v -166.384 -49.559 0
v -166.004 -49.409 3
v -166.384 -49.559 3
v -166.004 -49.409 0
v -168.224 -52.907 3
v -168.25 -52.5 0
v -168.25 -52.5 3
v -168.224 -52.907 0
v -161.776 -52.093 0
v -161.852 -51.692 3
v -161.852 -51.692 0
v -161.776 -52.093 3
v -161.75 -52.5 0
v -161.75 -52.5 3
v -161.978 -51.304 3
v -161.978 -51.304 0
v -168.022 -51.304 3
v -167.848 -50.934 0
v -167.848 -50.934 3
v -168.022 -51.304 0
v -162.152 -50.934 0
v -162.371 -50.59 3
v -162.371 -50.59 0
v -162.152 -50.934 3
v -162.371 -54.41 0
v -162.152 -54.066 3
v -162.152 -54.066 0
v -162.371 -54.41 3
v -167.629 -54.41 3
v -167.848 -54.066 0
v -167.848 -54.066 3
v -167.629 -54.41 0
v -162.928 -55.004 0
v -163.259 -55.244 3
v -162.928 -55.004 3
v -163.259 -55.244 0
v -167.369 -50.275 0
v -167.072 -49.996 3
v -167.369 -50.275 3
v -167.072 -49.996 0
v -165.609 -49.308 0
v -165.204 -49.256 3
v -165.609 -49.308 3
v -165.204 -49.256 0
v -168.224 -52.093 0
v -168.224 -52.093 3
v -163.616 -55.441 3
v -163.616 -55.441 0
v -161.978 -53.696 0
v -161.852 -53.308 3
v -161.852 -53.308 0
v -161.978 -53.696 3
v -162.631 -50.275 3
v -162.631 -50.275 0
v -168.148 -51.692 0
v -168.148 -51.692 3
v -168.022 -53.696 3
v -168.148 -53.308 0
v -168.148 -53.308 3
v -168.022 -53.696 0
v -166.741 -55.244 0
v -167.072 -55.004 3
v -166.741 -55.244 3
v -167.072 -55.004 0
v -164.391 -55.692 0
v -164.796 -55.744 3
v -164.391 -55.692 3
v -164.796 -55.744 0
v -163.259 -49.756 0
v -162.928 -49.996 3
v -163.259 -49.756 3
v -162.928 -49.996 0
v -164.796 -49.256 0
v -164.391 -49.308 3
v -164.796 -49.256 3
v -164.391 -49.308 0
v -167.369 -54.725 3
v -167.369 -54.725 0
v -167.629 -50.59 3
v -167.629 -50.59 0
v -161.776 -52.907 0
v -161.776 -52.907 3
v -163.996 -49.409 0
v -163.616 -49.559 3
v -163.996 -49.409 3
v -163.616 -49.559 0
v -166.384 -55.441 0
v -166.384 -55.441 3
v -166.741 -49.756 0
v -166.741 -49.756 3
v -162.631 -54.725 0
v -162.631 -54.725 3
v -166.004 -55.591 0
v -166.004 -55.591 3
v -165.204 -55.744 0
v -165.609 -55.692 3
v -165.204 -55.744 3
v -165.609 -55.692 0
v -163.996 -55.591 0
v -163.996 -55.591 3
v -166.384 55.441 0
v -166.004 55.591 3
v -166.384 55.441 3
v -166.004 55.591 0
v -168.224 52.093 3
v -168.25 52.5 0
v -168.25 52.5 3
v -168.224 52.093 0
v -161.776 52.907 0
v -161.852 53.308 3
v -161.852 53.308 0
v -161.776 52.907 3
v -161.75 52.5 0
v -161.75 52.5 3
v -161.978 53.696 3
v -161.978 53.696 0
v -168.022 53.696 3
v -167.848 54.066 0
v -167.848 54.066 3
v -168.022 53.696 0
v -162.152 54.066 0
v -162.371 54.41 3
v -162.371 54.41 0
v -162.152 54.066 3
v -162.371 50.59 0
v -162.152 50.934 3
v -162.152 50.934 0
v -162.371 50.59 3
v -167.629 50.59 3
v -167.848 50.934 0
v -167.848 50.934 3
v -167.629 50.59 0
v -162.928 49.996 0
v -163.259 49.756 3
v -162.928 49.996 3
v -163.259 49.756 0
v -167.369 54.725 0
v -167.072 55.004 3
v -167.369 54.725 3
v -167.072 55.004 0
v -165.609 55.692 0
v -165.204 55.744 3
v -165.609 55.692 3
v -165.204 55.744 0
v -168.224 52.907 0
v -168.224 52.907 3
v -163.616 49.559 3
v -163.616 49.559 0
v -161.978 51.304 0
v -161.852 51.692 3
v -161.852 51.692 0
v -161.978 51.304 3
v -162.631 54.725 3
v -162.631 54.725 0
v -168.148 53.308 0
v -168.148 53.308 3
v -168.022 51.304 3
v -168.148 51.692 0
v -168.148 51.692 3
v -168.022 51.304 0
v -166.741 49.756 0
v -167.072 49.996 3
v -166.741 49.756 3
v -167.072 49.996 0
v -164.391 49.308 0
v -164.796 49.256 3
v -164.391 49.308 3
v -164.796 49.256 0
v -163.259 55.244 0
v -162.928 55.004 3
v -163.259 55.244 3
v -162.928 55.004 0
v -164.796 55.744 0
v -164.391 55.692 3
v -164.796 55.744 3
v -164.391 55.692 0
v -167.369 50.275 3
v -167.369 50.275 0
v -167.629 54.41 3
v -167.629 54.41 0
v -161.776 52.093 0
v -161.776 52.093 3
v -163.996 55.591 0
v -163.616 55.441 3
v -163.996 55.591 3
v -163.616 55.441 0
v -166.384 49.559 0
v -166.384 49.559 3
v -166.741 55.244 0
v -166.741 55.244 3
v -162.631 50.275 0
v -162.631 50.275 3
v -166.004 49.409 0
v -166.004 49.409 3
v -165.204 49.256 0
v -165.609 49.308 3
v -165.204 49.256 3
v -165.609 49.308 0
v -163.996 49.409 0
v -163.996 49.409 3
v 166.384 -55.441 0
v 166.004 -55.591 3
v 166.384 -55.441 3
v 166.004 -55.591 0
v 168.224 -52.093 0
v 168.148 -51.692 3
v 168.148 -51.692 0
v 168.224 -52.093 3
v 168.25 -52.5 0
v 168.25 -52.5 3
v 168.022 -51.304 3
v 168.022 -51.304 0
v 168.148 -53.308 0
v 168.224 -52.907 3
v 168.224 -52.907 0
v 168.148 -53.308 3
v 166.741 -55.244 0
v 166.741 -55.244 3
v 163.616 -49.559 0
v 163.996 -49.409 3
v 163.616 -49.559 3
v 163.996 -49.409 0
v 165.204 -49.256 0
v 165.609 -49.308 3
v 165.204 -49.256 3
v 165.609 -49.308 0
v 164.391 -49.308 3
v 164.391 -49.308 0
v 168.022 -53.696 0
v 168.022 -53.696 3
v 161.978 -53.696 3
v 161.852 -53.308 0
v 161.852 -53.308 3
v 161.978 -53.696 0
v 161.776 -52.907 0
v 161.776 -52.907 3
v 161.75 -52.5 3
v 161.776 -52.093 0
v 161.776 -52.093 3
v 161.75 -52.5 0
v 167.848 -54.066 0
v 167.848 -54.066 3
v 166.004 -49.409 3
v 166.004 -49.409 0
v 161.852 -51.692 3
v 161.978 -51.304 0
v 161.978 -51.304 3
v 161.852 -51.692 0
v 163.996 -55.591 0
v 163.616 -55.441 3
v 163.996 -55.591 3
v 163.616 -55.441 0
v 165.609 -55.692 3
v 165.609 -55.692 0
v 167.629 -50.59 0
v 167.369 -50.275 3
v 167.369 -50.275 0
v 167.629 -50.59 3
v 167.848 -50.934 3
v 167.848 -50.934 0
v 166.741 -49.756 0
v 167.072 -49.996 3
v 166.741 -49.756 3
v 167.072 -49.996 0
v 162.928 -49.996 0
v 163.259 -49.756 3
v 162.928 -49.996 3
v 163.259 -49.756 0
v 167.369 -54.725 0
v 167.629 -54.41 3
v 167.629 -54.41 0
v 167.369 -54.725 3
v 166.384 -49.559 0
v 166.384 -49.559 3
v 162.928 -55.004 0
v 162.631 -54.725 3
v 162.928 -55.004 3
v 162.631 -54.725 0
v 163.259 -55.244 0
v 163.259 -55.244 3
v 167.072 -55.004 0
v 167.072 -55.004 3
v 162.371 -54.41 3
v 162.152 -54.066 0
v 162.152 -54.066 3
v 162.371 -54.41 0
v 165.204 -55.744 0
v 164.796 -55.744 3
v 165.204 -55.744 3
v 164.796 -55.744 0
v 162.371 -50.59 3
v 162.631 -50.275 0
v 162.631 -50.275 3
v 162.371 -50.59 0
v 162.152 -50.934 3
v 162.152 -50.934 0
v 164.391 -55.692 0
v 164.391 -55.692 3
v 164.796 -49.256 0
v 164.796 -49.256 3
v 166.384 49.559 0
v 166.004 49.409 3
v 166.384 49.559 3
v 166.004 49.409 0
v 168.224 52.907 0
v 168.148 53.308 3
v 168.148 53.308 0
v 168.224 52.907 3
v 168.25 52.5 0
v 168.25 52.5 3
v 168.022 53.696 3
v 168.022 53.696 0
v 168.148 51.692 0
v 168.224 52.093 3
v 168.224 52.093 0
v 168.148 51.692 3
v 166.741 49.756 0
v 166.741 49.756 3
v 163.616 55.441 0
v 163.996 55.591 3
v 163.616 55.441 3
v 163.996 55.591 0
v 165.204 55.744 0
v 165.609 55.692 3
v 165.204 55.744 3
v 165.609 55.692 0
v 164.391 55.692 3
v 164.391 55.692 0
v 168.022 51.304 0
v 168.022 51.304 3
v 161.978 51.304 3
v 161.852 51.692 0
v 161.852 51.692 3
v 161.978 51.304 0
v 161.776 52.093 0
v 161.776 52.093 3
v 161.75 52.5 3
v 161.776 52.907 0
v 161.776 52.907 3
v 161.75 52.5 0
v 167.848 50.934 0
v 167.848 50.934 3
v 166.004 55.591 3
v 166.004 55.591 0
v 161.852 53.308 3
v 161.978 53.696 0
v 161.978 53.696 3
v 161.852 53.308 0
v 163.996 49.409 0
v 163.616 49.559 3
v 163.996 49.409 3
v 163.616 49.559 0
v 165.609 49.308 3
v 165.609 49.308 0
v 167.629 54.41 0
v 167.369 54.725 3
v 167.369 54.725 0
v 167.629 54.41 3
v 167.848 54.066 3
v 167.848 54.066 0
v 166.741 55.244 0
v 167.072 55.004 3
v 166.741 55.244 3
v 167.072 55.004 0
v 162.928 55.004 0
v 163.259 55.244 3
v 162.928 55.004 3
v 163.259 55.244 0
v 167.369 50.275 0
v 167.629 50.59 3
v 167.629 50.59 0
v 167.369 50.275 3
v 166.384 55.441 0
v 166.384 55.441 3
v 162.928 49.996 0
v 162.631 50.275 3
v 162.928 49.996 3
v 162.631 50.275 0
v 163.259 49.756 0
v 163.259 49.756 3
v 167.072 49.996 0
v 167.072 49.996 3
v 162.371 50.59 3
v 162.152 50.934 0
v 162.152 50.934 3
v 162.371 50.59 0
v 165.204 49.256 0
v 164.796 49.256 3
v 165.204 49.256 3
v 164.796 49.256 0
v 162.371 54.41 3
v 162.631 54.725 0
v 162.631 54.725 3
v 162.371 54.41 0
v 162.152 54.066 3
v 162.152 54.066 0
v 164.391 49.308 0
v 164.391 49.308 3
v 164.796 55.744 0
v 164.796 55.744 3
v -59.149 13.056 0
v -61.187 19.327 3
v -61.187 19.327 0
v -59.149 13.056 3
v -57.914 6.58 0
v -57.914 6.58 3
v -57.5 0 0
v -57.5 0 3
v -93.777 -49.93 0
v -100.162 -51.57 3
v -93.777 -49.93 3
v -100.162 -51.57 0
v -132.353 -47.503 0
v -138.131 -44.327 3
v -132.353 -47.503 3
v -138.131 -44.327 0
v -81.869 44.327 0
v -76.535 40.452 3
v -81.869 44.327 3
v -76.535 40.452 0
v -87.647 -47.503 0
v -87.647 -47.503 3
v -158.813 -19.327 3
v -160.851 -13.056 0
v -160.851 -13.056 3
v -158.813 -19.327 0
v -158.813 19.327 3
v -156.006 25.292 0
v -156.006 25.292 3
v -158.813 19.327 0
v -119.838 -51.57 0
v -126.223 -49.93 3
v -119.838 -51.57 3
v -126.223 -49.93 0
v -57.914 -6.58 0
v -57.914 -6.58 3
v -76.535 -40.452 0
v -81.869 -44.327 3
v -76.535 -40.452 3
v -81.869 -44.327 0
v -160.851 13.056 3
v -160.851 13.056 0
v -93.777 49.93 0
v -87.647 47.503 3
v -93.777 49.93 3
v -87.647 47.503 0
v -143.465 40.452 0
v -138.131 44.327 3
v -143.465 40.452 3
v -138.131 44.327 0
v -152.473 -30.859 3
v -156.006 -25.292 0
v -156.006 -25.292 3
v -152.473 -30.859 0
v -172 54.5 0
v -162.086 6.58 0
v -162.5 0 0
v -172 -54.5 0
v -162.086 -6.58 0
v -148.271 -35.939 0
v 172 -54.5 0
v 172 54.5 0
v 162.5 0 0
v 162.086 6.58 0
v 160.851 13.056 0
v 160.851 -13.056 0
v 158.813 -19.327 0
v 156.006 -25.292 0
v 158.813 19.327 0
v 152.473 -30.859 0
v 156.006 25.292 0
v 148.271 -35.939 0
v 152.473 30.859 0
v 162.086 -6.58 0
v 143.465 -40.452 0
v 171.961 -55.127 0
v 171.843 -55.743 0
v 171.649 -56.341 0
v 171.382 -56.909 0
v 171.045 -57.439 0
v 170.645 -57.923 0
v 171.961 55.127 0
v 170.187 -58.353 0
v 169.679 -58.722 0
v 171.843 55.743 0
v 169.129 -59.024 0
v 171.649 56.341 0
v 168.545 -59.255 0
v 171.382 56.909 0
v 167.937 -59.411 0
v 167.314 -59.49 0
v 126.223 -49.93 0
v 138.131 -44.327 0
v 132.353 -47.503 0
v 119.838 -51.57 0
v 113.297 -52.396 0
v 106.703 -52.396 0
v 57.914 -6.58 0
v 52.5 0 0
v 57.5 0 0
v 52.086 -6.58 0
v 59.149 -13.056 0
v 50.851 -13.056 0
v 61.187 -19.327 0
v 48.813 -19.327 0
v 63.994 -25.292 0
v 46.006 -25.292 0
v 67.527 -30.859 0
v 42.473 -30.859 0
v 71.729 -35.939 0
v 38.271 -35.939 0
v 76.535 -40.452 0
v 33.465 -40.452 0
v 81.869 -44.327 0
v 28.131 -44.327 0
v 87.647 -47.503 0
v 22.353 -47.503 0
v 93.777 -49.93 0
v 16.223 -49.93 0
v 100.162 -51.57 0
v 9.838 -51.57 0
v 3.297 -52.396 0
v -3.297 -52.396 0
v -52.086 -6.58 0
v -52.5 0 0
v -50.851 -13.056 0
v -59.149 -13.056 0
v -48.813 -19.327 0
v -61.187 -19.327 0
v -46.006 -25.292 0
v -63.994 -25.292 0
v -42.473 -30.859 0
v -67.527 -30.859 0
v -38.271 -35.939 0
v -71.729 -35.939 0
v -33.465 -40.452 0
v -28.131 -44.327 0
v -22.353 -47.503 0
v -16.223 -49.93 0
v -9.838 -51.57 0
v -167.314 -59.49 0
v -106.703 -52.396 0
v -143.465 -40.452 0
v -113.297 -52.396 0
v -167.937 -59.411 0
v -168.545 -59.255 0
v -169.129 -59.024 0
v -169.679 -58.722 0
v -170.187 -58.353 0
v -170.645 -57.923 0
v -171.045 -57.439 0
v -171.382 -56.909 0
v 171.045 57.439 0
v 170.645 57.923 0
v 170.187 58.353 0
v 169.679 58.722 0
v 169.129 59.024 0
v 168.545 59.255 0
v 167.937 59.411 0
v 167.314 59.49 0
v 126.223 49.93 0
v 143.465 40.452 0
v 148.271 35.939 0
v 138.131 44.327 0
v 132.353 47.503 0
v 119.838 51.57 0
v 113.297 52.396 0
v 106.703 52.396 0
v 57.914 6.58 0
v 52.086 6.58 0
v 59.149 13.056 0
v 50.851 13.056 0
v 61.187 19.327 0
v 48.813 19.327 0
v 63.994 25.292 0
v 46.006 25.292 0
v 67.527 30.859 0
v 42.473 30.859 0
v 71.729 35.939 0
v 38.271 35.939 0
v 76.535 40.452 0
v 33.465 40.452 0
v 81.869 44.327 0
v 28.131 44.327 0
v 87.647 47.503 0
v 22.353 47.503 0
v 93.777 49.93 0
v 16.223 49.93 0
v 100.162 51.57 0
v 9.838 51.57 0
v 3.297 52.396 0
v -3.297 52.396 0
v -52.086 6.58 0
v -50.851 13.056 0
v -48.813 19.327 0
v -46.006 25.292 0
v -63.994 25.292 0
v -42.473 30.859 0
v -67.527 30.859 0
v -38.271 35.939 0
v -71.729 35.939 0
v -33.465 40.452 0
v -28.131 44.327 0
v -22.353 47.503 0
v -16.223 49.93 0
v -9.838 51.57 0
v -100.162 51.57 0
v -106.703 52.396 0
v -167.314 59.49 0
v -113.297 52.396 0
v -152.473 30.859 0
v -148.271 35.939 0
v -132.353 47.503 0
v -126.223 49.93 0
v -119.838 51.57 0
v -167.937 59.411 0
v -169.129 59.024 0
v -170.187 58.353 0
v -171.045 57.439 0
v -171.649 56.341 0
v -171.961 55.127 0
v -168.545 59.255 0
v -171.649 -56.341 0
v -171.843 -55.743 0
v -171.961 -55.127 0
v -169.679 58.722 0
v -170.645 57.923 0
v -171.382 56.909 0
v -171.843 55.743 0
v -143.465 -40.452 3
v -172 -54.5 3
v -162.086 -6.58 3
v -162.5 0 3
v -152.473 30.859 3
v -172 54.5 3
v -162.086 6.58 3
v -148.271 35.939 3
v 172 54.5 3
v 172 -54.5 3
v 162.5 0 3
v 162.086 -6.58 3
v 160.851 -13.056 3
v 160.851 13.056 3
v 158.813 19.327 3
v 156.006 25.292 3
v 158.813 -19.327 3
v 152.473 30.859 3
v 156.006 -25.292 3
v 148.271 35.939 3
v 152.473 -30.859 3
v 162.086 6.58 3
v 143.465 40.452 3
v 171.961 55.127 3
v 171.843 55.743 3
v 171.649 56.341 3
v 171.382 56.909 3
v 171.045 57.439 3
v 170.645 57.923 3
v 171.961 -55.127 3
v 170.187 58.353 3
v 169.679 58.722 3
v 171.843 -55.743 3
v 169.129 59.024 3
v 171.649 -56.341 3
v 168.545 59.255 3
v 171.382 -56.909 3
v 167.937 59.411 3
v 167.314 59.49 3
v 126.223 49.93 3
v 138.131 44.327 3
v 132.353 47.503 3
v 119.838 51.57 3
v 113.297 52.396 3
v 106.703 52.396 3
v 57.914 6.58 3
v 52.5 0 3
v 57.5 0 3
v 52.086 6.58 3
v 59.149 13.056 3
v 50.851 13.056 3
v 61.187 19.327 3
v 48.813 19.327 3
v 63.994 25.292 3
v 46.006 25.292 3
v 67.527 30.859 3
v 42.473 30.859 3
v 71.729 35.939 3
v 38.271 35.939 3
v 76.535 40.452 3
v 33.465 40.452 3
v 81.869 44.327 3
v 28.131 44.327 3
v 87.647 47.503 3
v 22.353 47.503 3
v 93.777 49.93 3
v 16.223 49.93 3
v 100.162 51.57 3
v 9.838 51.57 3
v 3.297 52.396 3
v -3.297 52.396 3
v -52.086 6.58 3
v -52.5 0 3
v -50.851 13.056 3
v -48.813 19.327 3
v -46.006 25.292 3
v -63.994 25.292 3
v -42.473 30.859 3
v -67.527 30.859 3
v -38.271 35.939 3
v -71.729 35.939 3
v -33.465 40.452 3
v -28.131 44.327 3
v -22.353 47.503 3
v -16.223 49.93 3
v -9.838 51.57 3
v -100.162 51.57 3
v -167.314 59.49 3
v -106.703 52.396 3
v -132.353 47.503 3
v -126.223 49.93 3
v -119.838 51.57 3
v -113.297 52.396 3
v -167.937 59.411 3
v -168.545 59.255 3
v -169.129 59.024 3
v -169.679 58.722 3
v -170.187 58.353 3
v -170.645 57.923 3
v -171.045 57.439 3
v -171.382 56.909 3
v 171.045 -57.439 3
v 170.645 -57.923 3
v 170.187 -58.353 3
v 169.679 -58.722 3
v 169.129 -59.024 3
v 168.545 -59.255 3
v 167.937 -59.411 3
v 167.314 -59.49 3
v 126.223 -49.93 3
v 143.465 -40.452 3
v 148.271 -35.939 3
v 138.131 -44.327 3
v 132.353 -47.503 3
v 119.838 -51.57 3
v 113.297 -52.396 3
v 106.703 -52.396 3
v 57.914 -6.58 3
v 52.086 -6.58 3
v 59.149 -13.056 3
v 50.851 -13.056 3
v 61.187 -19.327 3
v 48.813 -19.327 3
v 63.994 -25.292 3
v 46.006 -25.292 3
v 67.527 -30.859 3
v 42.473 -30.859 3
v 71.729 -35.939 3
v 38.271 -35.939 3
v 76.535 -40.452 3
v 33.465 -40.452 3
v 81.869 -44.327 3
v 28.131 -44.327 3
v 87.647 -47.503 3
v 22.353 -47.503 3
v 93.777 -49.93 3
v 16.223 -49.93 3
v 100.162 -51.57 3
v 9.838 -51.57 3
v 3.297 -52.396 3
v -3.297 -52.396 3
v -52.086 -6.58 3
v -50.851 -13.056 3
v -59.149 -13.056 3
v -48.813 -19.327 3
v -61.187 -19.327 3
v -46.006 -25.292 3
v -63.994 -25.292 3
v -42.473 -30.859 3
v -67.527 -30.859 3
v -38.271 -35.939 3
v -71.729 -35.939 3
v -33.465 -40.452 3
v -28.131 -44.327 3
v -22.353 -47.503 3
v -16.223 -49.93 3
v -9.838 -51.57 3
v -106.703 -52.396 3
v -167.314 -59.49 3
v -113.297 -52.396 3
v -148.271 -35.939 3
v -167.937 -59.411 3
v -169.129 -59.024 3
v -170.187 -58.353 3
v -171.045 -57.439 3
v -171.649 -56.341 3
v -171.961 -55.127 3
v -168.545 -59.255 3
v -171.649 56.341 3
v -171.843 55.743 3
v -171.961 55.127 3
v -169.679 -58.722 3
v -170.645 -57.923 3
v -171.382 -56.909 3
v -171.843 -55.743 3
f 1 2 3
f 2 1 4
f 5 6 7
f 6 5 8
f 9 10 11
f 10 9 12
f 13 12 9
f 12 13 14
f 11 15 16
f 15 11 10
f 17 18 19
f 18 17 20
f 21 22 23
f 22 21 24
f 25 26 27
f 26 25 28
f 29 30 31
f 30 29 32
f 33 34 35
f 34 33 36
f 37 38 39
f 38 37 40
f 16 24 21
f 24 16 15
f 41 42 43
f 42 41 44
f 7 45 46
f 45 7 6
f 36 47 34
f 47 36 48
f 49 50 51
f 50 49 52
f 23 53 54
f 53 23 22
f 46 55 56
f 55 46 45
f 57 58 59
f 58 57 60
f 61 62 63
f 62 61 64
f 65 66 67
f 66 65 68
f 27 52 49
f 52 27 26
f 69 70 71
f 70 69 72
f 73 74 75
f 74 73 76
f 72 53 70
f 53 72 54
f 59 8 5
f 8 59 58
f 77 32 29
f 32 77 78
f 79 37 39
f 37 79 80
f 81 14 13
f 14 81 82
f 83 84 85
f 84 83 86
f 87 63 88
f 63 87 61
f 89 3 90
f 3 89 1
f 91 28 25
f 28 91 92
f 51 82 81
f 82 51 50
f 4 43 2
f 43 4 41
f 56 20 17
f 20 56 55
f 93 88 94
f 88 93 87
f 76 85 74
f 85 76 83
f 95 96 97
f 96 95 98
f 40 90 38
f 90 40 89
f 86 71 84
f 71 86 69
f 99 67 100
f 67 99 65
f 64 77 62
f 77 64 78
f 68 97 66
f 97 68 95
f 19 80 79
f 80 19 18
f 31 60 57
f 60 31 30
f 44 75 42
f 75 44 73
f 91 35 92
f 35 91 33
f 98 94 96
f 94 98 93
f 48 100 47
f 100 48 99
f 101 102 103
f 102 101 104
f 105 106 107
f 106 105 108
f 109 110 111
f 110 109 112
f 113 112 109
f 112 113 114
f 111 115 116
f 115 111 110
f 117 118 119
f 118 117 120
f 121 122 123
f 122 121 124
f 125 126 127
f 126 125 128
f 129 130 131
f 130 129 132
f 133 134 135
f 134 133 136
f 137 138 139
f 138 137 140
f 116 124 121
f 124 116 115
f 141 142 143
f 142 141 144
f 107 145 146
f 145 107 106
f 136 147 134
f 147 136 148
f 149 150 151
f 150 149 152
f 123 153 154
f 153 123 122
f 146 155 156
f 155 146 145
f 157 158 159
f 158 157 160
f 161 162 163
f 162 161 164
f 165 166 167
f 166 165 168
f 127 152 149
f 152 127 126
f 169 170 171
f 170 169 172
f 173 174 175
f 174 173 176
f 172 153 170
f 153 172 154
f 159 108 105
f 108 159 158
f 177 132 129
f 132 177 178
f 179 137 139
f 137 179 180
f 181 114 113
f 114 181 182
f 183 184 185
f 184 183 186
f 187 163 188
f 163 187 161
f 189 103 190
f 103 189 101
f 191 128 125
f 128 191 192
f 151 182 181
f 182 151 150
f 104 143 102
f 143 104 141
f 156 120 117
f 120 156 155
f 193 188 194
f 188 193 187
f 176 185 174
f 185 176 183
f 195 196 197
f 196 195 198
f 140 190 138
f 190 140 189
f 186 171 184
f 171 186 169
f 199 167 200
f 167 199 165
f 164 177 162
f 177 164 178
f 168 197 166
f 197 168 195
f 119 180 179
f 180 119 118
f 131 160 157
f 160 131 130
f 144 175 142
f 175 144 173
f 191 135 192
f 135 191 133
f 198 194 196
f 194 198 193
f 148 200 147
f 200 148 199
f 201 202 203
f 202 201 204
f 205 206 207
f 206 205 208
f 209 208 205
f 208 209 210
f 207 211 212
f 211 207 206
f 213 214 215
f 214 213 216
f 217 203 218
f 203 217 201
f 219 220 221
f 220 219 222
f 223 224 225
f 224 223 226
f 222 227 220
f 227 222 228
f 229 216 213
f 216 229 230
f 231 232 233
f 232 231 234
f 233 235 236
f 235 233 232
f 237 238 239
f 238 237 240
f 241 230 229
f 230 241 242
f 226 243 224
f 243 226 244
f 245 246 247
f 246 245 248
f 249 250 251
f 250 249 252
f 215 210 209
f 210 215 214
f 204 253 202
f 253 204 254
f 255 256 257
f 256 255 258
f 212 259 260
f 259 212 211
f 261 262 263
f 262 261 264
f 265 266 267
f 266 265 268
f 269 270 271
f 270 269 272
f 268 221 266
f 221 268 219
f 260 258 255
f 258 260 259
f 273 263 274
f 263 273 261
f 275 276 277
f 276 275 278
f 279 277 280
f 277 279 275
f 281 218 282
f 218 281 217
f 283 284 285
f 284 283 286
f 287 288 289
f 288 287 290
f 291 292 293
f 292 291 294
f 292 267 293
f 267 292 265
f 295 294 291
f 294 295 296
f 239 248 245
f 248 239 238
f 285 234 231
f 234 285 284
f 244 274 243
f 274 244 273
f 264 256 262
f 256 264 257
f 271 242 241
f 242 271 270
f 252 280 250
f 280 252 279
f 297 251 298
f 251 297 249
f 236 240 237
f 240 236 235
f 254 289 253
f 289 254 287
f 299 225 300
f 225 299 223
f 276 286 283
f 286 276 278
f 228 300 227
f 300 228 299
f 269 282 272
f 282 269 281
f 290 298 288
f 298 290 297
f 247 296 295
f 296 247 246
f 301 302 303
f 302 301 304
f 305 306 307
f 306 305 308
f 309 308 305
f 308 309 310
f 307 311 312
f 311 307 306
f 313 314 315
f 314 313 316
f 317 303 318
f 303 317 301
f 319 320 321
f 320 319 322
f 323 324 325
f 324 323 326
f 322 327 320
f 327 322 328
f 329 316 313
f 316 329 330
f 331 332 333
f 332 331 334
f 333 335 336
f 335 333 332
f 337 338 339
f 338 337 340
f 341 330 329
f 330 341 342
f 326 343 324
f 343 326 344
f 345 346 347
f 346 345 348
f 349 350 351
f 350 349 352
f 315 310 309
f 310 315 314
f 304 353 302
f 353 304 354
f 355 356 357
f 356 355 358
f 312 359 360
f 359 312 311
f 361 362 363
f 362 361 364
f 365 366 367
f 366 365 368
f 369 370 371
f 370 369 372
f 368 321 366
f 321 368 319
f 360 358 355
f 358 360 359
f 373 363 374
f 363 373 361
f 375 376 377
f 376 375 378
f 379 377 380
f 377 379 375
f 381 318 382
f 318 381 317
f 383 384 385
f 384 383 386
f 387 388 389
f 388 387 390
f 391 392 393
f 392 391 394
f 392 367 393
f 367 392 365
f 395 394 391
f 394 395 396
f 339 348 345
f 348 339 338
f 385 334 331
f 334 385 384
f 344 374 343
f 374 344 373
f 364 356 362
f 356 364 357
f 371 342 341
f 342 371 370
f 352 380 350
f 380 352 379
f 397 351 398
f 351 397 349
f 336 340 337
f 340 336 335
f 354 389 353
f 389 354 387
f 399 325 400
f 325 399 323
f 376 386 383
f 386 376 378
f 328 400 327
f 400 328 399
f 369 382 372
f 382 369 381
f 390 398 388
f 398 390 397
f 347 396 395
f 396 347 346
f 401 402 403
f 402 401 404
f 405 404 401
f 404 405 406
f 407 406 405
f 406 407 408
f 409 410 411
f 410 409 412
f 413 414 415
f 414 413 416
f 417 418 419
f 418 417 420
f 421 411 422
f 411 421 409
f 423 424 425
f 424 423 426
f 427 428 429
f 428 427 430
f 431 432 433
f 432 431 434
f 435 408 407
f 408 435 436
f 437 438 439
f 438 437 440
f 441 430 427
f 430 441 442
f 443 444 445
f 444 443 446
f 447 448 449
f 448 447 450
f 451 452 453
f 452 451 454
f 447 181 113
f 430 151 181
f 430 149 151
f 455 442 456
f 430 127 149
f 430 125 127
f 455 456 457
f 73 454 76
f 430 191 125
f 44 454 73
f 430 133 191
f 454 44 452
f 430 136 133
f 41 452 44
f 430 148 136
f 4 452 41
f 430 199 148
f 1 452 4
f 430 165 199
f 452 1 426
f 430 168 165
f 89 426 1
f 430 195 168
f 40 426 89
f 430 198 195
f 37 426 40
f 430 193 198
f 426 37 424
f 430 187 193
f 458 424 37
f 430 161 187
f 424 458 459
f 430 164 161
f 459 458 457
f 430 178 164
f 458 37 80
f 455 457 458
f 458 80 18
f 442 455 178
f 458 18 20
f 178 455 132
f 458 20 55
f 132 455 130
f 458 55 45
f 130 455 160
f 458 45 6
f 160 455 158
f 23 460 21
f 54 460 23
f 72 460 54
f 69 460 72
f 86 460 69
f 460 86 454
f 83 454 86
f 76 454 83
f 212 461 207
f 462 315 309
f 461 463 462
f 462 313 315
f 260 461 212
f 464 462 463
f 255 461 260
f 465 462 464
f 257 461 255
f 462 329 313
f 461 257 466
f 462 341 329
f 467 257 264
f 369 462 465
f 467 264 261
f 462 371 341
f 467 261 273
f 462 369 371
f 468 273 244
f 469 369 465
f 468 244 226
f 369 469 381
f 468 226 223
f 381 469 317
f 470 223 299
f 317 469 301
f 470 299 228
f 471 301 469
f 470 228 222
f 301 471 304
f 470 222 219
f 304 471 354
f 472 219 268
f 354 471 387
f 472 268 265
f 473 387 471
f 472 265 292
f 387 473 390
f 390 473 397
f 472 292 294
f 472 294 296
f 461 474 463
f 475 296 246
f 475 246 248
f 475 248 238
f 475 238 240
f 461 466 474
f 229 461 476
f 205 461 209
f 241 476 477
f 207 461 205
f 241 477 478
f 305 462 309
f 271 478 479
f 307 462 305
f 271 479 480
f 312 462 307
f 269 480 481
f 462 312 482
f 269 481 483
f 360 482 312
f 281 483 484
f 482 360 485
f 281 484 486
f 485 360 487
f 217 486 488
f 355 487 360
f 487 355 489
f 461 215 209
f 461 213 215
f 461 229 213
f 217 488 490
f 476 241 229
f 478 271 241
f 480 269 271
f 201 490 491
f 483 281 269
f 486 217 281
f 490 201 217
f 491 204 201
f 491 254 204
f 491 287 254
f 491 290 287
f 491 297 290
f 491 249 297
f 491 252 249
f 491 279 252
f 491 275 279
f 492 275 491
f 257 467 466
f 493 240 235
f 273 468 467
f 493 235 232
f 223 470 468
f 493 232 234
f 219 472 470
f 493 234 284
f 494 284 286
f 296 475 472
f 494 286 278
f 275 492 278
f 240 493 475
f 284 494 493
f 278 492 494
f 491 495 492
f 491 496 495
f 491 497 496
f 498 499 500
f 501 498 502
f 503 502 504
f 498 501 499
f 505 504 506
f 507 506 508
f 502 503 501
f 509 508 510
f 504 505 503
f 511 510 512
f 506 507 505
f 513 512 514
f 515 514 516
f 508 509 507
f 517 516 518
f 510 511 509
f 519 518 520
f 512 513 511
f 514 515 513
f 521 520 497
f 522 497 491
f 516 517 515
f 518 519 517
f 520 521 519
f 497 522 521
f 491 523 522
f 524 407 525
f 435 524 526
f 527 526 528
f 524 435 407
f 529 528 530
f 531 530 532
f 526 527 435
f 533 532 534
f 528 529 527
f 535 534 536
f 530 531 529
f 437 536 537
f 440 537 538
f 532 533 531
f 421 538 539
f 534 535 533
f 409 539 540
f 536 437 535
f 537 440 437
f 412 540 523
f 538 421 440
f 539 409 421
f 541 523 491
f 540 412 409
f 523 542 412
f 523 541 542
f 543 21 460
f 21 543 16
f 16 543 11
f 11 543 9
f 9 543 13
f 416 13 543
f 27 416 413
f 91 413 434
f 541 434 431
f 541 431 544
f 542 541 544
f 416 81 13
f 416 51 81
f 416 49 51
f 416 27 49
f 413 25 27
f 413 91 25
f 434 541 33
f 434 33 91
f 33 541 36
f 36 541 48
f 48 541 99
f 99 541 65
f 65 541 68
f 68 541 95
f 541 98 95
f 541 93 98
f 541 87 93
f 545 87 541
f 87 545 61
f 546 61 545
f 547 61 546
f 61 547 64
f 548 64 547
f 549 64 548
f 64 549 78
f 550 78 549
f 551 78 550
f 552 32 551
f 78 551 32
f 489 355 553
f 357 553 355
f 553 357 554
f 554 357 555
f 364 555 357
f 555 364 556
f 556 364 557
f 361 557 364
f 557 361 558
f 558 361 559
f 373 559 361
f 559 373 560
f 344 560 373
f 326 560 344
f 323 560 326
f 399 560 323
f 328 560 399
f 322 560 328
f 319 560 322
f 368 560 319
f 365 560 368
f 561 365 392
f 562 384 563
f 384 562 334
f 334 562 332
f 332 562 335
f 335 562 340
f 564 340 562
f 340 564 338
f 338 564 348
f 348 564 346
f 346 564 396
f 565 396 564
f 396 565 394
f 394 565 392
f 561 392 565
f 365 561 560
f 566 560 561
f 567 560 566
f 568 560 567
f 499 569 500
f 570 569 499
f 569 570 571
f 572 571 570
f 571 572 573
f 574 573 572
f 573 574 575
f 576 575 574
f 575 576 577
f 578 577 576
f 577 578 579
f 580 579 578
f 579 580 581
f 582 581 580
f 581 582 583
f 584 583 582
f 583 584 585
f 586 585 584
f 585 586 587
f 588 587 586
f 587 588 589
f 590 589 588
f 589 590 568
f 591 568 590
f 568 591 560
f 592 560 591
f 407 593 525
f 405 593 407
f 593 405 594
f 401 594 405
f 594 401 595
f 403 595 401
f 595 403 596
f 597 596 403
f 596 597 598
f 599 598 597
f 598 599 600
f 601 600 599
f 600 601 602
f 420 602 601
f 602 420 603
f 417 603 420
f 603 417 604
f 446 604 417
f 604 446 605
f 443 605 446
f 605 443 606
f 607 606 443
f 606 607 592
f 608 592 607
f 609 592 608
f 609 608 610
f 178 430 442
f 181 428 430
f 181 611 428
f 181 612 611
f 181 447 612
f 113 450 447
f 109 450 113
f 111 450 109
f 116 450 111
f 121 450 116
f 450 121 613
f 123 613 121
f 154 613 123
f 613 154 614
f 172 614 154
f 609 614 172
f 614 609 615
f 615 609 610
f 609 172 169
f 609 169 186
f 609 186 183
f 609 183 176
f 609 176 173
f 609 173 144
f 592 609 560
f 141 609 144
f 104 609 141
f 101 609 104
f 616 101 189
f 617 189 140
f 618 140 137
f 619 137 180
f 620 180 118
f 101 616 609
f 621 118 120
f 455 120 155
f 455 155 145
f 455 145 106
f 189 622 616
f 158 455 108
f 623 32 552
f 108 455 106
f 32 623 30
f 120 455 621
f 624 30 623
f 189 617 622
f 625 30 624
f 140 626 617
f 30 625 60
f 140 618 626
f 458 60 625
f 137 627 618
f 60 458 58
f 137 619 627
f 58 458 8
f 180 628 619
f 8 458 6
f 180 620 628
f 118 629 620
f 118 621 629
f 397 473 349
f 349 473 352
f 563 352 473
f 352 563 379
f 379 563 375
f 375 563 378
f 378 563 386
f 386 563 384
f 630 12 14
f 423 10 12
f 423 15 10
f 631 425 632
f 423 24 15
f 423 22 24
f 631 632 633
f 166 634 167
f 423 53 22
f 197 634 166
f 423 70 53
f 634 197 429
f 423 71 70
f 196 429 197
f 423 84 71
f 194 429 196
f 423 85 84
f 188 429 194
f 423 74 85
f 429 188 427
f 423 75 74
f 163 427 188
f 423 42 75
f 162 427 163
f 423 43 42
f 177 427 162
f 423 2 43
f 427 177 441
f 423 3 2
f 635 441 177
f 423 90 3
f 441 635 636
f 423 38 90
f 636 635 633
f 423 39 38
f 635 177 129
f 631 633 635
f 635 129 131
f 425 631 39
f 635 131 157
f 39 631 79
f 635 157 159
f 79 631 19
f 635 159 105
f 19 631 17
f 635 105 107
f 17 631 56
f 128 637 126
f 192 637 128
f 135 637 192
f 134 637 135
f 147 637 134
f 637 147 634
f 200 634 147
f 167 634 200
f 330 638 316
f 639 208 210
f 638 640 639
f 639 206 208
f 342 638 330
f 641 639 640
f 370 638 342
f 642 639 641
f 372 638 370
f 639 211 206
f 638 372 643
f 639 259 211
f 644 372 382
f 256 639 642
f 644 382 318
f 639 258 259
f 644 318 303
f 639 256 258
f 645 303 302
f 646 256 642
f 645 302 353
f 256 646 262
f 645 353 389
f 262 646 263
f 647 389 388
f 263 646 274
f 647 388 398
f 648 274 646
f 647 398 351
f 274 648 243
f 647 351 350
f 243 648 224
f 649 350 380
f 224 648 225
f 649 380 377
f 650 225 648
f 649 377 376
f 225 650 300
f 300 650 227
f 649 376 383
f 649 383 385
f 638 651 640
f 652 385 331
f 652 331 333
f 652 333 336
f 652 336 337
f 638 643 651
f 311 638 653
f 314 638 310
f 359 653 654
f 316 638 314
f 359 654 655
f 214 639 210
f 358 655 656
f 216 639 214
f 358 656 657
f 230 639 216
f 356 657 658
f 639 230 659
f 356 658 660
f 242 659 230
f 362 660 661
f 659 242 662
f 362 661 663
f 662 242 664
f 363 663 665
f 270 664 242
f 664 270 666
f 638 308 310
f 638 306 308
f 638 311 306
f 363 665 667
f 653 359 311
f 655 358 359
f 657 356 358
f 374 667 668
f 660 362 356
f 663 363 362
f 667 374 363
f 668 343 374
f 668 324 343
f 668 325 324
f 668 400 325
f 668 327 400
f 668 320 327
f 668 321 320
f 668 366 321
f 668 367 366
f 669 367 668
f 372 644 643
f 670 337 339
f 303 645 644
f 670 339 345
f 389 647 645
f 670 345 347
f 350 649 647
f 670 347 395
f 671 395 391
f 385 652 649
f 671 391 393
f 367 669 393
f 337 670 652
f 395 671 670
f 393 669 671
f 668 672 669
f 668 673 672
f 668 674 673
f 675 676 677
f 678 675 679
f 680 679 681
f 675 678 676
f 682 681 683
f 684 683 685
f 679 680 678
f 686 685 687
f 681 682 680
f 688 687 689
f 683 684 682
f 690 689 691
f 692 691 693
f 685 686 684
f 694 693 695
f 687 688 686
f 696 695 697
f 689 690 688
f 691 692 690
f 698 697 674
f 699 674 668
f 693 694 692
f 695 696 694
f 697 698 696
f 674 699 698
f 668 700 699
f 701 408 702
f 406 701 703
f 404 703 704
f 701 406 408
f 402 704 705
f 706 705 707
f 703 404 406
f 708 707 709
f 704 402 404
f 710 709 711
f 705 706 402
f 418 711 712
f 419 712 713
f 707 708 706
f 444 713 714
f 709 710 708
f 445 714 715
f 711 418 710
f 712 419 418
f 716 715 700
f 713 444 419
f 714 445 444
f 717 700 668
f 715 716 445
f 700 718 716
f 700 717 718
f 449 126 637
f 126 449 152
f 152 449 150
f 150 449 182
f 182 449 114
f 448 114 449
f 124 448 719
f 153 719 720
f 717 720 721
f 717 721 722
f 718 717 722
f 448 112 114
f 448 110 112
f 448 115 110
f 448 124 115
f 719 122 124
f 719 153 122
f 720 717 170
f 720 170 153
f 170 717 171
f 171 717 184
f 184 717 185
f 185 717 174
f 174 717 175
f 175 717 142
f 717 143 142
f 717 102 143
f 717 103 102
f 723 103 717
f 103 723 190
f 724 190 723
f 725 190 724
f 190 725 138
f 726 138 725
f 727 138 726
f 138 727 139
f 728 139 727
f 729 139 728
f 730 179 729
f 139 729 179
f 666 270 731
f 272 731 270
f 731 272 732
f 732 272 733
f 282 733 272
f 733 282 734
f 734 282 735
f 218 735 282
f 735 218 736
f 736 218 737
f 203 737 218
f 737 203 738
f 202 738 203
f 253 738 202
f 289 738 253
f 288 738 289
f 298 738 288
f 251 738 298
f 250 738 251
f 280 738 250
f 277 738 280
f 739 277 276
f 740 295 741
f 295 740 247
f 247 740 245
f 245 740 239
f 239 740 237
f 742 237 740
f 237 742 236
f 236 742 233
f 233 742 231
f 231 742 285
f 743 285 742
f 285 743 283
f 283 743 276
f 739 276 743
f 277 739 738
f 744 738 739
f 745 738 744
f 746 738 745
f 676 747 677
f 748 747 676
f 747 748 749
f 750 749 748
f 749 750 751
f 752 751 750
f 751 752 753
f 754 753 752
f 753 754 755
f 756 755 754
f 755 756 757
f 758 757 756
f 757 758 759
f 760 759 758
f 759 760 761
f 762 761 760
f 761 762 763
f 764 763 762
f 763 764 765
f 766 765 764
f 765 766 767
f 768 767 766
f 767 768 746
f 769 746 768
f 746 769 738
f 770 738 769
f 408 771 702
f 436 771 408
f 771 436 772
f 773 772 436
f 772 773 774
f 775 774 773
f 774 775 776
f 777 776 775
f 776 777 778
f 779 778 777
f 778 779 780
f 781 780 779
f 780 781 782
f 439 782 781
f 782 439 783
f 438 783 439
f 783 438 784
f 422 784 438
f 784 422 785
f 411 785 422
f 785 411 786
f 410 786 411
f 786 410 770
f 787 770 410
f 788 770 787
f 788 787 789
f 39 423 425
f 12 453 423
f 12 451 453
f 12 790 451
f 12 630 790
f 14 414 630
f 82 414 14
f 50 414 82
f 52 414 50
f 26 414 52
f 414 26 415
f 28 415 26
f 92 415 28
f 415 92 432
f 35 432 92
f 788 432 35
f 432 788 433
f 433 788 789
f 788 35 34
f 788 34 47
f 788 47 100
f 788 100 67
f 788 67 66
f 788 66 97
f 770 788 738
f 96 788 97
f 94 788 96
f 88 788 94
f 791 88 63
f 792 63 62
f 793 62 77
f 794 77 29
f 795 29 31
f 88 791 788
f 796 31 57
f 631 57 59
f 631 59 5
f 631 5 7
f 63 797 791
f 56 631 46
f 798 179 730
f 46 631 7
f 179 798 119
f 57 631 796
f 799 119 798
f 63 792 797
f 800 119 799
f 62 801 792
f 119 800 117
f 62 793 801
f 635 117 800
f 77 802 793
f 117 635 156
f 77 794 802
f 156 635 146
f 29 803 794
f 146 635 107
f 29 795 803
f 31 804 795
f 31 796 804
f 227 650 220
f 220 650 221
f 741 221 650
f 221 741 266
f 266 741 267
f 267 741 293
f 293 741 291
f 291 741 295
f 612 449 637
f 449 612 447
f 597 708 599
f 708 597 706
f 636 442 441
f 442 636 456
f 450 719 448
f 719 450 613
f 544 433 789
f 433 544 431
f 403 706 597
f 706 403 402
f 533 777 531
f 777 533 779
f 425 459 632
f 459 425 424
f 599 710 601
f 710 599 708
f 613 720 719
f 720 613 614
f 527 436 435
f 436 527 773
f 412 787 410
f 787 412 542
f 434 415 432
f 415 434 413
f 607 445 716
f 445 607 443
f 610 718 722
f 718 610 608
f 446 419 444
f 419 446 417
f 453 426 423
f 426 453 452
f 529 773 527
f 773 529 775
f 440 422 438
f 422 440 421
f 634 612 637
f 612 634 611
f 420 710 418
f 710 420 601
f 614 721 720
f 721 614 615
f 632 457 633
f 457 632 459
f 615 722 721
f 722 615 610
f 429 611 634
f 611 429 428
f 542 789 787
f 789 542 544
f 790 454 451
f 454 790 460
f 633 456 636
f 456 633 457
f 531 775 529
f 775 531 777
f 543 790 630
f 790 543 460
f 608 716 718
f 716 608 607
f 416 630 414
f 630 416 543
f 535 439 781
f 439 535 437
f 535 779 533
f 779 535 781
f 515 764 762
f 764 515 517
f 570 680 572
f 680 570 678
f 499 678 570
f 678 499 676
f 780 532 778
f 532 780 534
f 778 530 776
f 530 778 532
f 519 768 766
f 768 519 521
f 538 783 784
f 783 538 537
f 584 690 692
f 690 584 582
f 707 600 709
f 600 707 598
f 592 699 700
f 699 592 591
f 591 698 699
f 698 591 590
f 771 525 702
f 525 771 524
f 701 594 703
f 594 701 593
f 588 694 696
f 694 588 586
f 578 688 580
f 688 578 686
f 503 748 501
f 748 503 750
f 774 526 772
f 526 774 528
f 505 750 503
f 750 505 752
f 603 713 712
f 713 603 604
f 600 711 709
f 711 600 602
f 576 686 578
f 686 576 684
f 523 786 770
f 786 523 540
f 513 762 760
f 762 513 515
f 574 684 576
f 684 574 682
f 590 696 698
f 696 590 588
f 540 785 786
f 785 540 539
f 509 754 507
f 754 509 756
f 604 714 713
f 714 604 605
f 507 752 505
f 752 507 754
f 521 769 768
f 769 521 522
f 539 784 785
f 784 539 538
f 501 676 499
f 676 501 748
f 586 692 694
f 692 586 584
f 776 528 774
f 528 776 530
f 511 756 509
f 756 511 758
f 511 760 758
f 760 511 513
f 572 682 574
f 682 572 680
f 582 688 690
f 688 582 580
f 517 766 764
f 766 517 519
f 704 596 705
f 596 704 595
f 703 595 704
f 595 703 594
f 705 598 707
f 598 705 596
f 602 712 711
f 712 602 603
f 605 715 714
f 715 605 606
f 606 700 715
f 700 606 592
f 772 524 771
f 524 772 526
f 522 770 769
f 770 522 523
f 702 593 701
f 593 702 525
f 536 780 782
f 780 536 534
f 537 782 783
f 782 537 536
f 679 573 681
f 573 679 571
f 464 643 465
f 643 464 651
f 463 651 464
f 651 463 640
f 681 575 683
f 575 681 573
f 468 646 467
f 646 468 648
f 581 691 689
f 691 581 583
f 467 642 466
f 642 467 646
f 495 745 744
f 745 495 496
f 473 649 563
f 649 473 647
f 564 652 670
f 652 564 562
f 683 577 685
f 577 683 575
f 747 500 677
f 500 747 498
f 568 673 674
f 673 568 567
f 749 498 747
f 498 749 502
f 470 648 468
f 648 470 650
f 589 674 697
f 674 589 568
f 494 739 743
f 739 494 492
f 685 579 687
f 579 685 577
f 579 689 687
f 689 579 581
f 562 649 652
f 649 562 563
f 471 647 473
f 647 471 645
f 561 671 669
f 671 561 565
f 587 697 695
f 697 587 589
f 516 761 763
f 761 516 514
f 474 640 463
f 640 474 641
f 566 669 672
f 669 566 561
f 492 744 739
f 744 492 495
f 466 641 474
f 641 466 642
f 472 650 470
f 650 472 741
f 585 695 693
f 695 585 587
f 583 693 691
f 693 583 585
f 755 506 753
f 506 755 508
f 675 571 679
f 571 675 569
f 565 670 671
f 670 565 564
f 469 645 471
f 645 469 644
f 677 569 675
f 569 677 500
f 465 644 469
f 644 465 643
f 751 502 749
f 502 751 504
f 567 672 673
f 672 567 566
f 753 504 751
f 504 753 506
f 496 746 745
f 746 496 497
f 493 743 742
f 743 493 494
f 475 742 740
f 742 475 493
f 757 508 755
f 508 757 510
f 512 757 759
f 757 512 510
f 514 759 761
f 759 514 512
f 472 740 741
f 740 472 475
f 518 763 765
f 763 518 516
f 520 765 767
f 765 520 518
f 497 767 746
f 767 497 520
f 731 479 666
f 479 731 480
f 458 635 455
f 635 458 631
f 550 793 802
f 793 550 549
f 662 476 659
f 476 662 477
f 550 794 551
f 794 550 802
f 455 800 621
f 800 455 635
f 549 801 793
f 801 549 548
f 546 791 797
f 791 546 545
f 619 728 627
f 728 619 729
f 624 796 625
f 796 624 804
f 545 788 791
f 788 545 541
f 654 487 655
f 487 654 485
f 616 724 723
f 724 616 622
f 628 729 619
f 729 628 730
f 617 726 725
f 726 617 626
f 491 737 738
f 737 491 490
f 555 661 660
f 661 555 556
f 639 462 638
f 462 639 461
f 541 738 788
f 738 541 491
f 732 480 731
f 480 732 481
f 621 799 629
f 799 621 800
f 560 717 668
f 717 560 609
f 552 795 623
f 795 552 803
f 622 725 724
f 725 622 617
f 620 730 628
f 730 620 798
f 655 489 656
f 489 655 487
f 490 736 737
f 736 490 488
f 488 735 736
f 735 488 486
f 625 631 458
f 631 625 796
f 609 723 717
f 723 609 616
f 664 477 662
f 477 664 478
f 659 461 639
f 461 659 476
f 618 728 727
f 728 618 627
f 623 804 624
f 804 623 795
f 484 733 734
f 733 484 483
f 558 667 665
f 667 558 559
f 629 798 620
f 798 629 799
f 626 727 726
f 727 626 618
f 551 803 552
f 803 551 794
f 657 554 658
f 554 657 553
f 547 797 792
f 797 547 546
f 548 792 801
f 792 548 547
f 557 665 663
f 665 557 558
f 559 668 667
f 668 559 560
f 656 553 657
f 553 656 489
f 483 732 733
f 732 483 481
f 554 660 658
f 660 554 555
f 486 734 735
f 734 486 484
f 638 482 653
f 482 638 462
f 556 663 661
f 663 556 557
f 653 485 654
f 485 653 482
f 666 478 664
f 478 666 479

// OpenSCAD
$fn = 50;

difference() {
	union() {
		hull() {
			translate(v = [-167.0, 54.5, 0]) {
				cylinder(h = 3, r = 5);
			}
			translate(v = [167.0, 54.5, 0]) {
				cylinder(h = 3, r = 5);
			}
			translate(v = [-167.0, -54.5, 0]) {
				cylinder(h = 3, r = 5);
			}
			translate(v = [167.0, -54.5, 0]) {
				cylinder(h = 3, r = 5);
			}
		}
	}
	union() {
		translate(v = [-165.0, -52.5, -100.0]) {
			cylinder(h = 200, r = 3.25);
		}
		translate(v = [-165.0, 52.5, -100.0]) {
			cylinder(h = 200, r = 3.25);
		}
		translate(v = [165.0, -52.5, -100.0]) {
			cylinder(h = 200, r = 3.25);
		}
		translate(v = [165.0, 52.5, -100.0]) {
			cylinder(h = 200, r = 3.25);
		}
		translate(v = [-165.0, -52.5, -100.0]) {
			cylinder(h = 200, r = 1.8);
		}
		translate(v = [-165.0, 52.5, -100.0]) {
			cylinder(h = 200, r = 1.8);
		}
		translate(v = [165.0, -52.5, -100.0]) {
			cylinder(h = 200, r = 1.8);
		}
		translate(v = [165.0, 52.5, -100.0]) {
			cylinder(h = 200, r = 1.8);
		}
		translate(v = [-110.0, 0, 0.0]) {
			cylinder(h = 3, r = 52.5);
		}
		cylinder(h = 3, r = 52.5);
		translate(v = [110.0, 0, 0.0]) {
			cylinder(h = 3, r = 52.5);
		}
	}
}
